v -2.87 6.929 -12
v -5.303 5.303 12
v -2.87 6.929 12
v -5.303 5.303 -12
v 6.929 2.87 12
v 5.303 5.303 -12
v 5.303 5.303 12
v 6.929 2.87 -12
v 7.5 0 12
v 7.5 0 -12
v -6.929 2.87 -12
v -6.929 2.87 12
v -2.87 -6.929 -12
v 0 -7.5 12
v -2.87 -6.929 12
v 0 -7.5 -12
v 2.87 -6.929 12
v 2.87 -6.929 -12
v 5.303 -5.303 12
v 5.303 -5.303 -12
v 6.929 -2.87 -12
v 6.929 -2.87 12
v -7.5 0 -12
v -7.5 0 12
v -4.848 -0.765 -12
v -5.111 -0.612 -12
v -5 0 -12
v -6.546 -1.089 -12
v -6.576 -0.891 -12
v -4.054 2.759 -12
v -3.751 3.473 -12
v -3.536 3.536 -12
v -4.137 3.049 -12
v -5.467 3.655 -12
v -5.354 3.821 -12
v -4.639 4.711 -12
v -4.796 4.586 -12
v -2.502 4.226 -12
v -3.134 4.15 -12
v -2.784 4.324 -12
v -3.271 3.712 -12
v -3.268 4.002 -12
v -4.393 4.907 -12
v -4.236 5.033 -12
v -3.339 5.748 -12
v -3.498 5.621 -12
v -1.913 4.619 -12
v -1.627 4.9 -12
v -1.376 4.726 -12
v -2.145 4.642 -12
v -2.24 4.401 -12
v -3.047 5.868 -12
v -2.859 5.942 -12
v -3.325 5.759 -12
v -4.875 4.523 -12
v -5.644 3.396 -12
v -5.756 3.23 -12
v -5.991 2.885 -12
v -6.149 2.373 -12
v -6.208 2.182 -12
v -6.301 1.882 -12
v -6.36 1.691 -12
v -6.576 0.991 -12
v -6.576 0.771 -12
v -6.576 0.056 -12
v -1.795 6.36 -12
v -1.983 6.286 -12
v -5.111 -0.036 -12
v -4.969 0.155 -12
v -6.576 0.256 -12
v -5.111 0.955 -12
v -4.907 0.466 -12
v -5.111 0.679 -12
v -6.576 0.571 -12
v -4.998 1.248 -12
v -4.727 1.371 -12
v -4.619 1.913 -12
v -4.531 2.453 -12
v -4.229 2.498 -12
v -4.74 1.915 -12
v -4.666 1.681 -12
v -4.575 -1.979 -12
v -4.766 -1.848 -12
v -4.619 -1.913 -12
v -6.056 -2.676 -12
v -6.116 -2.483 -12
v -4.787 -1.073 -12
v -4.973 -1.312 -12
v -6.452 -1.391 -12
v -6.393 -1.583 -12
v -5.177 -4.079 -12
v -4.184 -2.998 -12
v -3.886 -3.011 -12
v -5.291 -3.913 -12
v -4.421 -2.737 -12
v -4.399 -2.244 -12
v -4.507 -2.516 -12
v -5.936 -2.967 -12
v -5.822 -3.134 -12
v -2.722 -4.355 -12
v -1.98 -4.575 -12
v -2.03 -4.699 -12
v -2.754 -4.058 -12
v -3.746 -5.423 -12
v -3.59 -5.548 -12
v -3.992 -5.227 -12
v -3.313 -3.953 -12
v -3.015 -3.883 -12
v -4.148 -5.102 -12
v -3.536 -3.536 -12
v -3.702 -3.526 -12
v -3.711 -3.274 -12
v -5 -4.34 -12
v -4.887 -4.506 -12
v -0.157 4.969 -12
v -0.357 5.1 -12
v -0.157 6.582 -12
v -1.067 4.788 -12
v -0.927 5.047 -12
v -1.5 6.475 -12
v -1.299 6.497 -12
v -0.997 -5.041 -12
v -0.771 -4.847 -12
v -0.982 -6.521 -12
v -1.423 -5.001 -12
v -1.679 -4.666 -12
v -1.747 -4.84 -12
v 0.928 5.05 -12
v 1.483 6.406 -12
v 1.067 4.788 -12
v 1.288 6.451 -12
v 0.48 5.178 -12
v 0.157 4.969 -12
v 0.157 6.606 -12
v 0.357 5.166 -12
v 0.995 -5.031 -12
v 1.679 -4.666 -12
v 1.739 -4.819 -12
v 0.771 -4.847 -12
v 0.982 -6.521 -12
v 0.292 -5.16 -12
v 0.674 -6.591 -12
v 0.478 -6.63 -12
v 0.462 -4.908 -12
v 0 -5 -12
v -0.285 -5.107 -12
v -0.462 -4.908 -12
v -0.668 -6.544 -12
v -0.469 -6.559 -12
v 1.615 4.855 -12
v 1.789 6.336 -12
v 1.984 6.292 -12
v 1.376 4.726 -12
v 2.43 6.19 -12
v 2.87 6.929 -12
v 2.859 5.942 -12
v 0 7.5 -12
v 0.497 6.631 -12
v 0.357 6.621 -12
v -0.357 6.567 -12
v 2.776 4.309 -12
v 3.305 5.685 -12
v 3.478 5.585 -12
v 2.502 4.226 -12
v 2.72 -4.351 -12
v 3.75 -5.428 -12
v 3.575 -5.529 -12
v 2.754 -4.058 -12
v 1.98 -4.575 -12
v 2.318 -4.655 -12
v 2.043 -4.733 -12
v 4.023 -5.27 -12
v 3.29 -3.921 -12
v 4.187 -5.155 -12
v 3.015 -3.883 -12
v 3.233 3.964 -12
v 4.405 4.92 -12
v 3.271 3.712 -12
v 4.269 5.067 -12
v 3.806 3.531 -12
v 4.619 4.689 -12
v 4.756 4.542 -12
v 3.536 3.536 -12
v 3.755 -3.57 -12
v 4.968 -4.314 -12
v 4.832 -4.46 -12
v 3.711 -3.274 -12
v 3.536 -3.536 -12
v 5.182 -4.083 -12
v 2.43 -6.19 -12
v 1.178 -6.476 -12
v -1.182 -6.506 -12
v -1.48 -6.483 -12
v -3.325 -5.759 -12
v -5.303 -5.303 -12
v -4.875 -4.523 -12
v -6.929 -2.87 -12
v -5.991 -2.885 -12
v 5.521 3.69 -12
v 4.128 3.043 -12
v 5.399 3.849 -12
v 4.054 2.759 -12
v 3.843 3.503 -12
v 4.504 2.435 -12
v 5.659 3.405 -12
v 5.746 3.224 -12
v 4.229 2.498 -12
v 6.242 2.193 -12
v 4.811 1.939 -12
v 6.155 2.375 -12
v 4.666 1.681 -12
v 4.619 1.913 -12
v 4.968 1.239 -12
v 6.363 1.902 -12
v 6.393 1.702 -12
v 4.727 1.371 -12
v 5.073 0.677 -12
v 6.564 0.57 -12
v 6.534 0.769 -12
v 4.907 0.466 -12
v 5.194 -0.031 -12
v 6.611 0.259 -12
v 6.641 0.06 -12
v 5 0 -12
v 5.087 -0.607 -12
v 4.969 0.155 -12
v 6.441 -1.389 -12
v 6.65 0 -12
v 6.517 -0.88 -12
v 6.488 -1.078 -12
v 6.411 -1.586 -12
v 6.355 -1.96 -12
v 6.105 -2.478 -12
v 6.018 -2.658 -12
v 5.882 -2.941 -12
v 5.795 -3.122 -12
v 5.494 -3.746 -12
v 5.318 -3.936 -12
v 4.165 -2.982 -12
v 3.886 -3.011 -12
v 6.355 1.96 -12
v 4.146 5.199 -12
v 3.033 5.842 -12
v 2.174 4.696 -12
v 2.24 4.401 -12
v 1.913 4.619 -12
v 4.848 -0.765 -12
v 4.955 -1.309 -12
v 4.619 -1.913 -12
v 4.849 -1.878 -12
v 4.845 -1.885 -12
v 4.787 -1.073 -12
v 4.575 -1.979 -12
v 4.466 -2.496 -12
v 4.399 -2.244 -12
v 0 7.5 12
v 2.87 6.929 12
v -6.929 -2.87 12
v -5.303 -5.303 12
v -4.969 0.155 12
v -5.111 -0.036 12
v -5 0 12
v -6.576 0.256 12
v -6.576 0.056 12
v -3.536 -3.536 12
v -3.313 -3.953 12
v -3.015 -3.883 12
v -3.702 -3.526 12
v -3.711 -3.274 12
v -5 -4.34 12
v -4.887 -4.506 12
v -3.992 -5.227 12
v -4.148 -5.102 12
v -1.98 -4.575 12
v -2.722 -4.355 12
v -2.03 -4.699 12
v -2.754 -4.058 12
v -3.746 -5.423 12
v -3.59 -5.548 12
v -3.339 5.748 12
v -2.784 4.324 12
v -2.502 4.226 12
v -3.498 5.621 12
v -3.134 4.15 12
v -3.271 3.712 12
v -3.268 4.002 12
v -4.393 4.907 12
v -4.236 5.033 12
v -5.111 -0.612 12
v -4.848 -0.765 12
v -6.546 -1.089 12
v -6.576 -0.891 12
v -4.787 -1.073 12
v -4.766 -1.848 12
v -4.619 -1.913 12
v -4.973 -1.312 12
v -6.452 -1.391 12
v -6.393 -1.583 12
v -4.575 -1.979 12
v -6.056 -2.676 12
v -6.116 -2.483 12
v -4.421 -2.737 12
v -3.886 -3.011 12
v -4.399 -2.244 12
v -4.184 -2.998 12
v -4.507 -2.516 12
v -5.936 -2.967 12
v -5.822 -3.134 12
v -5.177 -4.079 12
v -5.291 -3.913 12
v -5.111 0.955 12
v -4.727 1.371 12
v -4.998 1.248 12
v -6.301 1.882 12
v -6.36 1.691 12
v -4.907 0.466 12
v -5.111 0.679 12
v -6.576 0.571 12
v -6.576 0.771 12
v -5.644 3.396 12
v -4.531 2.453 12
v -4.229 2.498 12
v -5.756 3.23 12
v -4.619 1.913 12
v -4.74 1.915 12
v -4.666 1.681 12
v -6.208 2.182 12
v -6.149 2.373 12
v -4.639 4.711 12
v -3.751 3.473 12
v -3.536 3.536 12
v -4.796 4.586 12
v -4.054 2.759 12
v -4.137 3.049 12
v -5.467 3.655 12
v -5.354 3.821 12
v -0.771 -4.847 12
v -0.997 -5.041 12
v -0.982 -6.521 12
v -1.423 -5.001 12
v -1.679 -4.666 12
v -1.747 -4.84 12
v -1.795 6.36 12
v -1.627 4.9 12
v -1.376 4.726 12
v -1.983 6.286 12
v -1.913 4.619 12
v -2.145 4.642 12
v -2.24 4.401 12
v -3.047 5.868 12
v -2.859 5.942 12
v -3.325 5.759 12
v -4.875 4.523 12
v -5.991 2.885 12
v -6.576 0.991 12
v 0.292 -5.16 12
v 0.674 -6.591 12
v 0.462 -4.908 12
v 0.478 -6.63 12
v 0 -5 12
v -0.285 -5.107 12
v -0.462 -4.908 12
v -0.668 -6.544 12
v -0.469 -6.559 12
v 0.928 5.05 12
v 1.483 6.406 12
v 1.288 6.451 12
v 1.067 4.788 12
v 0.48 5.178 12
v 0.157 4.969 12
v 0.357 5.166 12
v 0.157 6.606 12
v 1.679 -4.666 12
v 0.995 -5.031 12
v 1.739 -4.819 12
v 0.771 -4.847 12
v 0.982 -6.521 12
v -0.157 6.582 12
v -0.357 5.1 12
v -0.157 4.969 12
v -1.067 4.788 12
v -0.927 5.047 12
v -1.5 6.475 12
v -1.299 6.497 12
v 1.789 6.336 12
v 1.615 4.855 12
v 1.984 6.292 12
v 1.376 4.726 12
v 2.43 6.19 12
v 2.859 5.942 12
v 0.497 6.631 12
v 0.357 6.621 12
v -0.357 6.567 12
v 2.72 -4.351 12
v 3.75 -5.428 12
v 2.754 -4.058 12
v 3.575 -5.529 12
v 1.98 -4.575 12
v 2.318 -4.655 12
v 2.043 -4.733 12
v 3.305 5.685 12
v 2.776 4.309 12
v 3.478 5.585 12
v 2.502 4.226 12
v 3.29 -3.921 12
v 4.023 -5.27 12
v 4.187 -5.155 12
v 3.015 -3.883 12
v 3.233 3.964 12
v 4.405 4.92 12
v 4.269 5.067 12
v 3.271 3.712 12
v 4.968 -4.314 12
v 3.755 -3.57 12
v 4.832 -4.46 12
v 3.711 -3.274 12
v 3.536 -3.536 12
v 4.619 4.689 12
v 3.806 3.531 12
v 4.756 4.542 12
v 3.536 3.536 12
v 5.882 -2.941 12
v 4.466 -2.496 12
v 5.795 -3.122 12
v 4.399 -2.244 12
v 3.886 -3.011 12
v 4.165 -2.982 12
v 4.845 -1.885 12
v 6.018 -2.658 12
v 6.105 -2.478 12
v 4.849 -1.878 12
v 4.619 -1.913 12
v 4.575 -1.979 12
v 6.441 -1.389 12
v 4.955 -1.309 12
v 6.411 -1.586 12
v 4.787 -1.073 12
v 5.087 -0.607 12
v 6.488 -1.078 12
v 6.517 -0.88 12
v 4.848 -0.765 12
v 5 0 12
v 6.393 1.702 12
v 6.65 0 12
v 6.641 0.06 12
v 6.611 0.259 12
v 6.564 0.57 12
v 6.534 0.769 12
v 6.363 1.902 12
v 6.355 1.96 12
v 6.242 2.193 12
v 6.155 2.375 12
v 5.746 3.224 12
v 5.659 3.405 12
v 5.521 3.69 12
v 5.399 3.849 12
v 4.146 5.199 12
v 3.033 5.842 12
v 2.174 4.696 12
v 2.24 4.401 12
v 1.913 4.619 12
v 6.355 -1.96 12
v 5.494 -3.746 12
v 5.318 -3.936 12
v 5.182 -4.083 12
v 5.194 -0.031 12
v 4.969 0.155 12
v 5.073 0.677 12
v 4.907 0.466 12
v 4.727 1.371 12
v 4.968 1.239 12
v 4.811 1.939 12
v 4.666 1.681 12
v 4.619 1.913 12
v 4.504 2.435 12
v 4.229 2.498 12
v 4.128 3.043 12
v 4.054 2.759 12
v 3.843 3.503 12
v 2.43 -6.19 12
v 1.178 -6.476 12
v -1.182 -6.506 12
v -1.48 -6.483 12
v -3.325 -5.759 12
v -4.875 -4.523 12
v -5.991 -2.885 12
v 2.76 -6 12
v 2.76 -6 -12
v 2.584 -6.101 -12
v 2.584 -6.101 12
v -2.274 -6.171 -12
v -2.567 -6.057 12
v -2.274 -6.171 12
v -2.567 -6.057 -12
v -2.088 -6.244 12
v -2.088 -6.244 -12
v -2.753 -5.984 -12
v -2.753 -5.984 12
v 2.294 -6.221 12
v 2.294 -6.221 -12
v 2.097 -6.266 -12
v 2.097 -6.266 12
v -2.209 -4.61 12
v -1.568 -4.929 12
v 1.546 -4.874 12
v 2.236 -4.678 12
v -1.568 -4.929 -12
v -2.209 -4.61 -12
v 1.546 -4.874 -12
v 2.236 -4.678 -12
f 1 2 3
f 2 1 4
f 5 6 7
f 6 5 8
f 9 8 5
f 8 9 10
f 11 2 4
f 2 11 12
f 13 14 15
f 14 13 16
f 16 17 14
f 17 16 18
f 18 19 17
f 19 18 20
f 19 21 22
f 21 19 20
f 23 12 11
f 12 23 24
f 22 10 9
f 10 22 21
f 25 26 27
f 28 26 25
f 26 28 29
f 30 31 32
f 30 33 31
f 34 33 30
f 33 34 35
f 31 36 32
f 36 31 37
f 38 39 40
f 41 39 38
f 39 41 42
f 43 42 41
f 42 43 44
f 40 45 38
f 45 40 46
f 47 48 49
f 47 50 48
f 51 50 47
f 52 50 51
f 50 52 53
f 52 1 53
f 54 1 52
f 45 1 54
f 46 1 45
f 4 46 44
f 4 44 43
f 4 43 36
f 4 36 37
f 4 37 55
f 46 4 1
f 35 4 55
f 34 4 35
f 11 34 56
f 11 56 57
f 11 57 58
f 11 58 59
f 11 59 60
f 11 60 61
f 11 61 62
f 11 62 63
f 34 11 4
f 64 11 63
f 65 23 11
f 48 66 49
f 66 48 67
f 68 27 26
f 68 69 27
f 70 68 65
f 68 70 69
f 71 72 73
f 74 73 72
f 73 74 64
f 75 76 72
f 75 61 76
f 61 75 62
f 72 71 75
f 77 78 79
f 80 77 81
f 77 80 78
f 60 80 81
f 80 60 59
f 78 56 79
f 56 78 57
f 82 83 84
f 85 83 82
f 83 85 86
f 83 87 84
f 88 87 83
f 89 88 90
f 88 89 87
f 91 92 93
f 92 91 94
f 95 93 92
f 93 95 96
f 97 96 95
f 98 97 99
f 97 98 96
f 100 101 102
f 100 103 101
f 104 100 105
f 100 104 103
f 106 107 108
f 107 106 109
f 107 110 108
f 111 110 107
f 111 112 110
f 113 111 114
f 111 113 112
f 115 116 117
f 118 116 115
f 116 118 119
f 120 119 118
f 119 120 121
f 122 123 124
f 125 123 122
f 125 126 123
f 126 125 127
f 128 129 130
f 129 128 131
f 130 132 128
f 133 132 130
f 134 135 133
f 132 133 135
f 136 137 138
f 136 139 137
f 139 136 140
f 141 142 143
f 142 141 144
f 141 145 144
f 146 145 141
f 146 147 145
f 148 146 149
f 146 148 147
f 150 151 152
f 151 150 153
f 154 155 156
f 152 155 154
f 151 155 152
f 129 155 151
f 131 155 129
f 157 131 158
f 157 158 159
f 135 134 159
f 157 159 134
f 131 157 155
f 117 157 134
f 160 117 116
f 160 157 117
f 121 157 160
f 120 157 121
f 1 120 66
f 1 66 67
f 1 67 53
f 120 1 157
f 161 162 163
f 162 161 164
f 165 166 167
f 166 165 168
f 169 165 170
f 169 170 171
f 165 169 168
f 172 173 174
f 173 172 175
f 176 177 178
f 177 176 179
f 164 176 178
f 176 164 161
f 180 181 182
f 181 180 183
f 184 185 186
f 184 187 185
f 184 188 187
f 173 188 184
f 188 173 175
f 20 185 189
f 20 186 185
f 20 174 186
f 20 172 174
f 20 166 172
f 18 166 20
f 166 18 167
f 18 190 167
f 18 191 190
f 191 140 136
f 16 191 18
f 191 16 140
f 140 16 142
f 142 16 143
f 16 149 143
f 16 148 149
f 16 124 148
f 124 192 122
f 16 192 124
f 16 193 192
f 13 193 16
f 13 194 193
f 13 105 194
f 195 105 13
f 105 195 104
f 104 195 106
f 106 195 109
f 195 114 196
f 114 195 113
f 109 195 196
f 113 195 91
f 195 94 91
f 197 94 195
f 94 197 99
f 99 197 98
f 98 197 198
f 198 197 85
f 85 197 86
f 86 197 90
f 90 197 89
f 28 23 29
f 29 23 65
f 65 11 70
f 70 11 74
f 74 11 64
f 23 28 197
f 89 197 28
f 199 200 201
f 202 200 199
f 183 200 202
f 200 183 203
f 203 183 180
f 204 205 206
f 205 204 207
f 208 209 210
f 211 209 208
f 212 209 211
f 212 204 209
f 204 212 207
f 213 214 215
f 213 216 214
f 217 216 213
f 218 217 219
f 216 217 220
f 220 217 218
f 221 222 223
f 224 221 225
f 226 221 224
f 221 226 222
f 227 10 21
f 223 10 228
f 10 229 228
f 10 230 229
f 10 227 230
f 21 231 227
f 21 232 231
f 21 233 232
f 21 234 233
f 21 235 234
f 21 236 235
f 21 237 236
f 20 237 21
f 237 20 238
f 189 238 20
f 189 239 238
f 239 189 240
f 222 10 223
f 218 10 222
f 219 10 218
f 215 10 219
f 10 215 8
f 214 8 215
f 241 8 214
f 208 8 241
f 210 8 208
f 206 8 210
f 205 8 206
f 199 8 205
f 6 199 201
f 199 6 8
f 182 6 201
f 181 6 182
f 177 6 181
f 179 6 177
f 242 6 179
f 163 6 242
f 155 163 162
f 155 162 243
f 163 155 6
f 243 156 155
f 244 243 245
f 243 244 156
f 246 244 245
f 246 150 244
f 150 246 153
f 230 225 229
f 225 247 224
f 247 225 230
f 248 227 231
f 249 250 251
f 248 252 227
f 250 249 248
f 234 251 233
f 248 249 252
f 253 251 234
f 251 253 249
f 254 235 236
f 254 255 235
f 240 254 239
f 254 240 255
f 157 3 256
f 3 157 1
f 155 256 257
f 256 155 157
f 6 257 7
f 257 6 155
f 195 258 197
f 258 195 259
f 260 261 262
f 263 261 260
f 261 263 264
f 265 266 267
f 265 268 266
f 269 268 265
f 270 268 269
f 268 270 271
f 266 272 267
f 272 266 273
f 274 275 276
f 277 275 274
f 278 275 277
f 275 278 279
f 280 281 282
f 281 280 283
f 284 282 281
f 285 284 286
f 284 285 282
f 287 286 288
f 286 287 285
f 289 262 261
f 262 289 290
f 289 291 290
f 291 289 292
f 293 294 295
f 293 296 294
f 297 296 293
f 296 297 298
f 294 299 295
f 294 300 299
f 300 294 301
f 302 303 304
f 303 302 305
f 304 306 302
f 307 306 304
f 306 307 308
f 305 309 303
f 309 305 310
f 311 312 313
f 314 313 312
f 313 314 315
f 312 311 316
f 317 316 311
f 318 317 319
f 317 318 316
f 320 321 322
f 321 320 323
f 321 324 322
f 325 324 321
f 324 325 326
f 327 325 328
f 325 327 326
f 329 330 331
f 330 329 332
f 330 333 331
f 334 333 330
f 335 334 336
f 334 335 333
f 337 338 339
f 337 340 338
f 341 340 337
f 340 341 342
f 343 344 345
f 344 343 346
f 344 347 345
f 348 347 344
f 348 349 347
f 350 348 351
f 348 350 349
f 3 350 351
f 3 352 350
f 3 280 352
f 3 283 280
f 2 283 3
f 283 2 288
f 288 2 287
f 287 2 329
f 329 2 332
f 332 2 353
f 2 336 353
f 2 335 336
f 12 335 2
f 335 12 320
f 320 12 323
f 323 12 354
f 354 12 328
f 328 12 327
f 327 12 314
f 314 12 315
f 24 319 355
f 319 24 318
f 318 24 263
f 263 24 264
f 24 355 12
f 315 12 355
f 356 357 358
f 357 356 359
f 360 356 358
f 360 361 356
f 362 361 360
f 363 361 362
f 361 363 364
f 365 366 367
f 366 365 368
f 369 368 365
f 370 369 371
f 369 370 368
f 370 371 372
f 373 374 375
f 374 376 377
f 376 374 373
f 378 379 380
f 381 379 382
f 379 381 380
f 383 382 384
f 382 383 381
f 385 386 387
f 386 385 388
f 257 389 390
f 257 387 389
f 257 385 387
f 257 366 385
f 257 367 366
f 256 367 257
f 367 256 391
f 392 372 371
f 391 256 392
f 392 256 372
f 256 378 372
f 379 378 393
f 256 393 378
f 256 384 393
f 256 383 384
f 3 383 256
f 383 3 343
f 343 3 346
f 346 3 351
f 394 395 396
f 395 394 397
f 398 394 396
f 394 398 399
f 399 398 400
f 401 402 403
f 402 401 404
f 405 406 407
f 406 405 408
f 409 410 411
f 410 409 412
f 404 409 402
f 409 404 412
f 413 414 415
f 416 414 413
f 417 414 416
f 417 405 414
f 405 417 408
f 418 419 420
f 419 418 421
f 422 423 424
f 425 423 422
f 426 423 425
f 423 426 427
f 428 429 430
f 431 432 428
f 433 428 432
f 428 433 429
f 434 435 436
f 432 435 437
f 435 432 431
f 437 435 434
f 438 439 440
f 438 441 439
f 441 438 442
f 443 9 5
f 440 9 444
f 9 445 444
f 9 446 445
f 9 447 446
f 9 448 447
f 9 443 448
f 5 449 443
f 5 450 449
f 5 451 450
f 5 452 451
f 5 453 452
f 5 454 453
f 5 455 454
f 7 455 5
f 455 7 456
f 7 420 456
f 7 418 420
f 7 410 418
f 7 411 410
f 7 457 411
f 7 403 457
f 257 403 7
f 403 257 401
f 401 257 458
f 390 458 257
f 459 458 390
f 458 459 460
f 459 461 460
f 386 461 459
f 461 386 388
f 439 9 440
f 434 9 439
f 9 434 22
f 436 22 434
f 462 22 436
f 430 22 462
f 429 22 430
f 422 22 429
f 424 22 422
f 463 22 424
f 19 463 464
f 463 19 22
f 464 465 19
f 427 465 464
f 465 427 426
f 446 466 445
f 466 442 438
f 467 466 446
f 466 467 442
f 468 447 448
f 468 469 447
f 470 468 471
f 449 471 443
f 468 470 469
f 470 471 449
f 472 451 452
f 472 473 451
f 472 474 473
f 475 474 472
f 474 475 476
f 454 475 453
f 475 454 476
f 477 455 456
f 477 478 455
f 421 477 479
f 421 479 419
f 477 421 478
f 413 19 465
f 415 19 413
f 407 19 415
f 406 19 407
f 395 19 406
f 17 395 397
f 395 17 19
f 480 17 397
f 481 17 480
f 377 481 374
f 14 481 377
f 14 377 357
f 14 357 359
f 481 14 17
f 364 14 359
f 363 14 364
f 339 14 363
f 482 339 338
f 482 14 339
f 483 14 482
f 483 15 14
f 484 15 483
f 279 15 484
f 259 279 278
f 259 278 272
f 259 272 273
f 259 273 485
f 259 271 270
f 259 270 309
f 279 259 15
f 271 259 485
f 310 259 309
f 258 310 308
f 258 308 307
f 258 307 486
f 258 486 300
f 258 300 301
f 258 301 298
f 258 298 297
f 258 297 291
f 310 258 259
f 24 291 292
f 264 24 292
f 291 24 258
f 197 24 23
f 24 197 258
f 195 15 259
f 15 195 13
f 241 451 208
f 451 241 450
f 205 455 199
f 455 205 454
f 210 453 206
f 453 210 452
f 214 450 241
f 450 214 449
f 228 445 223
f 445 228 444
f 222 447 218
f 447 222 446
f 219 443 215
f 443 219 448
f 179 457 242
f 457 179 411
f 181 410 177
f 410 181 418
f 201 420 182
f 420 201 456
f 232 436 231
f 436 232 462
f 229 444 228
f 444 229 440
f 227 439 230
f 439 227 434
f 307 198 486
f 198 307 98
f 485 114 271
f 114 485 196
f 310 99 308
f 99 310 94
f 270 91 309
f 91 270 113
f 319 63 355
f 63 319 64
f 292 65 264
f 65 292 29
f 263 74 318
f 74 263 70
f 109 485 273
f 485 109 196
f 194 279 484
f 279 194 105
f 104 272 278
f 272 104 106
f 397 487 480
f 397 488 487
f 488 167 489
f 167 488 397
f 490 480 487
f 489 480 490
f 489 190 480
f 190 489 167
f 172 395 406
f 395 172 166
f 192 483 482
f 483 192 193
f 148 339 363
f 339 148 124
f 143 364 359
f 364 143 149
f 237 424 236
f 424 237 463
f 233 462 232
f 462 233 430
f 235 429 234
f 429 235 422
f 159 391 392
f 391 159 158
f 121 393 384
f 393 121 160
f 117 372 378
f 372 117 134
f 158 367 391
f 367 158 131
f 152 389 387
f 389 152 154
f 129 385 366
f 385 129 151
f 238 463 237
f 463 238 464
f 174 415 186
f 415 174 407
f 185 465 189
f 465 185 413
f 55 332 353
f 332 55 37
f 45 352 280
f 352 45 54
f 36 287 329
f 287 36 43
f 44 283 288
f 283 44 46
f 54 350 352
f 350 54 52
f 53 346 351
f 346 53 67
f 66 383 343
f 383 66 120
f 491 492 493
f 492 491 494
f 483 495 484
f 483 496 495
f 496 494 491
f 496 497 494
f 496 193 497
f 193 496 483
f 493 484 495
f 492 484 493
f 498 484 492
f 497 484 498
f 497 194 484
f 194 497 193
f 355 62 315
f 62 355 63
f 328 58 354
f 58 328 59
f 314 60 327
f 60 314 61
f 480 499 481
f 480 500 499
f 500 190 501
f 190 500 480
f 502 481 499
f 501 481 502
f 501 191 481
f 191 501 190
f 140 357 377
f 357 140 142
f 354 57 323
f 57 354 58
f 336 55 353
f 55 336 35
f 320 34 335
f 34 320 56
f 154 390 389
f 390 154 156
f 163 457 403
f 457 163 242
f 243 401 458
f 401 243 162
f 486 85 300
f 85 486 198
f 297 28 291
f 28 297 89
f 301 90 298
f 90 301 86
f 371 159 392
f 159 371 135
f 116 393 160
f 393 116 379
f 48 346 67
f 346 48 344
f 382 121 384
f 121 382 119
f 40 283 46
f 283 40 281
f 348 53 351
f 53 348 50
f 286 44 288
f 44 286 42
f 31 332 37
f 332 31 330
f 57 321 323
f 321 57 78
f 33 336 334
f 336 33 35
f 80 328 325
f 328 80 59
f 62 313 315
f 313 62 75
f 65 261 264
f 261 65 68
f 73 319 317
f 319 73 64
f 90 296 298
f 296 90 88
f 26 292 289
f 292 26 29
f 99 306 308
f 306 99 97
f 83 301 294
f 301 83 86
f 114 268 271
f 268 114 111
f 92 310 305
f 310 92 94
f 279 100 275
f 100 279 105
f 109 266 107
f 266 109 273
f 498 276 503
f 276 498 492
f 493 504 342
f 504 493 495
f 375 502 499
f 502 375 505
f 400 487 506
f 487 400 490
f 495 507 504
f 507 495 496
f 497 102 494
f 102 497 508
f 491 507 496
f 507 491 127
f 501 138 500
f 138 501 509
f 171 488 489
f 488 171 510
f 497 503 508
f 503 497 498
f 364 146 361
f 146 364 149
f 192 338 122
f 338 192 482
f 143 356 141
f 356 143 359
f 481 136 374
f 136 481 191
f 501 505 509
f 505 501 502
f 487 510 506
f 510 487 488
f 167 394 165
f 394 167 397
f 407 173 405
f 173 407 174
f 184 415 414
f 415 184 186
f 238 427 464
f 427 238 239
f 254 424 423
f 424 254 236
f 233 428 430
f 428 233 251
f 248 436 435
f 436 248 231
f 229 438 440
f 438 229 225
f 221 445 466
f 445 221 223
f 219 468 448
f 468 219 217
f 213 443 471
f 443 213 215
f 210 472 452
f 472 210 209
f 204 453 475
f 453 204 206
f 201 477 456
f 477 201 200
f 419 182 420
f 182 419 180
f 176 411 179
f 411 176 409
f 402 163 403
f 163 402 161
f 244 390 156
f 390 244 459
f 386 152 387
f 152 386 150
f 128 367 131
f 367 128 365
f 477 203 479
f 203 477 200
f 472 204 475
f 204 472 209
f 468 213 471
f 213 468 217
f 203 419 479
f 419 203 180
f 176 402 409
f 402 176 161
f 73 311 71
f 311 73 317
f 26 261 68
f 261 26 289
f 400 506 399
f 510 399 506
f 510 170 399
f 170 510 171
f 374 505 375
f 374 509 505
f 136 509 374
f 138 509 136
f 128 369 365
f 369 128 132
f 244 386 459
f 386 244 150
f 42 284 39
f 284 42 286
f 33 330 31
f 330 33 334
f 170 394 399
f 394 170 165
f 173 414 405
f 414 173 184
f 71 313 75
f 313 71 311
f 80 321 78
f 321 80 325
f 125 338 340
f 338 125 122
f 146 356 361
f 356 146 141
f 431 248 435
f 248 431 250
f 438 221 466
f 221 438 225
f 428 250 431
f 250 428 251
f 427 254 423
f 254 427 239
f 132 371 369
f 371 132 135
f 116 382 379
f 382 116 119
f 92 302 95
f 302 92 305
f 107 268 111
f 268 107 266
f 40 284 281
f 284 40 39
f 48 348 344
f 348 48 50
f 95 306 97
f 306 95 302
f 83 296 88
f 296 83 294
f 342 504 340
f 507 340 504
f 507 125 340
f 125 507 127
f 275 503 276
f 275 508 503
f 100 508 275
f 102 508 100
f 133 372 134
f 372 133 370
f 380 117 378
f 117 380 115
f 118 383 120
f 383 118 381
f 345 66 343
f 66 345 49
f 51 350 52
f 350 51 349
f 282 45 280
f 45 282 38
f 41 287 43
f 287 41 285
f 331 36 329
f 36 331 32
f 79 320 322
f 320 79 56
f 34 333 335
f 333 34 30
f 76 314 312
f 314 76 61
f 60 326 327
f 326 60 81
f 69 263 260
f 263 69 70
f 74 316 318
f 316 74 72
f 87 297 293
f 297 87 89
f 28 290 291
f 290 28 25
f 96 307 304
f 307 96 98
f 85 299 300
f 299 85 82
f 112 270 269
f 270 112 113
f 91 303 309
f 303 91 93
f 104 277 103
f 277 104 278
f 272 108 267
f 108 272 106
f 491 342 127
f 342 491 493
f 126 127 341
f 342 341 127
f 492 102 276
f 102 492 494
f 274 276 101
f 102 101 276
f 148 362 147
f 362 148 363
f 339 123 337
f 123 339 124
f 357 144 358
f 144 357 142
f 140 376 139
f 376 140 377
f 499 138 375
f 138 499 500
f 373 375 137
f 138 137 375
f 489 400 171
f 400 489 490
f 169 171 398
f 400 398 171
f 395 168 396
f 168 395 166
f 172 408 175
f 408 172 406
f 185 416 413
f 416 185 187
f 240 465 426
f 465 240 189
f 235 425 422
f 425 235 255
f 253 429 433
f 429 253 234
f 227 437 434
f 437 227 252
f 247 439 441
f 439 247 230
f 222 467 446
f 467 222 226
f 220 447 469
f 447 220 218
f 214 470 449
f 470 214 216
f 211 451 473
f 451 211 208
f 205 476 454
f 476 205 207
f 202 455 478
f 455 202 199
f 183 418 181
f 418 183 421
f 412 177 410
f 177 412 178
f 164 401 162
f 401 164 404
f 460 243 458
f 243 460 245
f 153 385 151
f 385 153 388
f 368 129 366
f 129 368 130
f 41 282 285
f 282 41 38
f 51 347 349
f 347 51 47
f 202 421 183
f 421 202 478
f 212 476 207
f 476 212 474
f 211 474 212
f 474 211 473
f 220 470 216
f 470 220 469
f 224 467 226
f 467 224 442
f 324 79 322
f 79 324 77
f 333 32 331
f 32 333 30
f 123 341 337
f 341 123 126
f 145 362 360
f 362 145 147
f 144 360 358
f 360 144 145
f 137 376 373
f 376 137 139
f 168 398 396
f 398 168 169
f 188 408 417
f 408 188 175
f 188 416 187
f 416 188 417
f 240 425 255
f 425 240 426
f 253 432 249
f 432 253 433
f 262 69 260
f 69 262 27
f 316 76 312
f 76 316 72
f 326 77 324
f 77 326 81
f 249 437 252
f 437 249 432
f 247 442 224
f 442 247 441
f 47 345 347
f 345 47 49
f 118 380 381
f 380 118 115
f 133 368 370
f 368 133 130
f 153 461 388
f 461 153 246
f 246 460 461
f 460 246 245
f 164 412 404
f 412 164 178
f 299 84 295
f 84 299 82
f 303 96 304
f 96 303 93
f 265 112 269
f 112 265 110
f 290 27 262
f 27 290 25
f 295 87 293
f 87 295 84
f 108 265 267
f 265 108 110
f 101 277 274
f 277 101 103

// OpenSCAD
/* toothedLinearBearing
 * based on  Krallinger Sebastian's 2012 model:
 * http://www.thingiverse.com/thing:18219
 * Dual-licensed under 
 * Creative Commons Attribution-ShareAlike 3.0 (CC BY-SA) [http://creativecommons.org/licenses/by-sa/3.0/]
 * and
 * GPL v2 or later [http://www.gnu.org/licenses/].
 */

//Inner Diamiter of the baring. This is the size of the rod it's to be run on, in mm
int_Inner = 10; //[8:100]
//Outer Diamiter of the baring. diffrent shapes may need bigger/smaller outer diamiters
int_Outer = 15; //[15:115]
//Length of the baring
int_Length = 24;//[100]
//printer head diamiter
dec_Dia = 0.2;
//minimum thickness of the outer wall. 
dec_wallThick = 0.85;
//number of teeth, more the better, but dont be silly
int_teeth = 25; //[100]
//coverd length of the inner ring (Im not sure exactly what this does, but it doesnt work right without it)
dec_toothRatio = 0.25;
//number of sides for the outside of the baring (3 = triange, 4 = square ect)
int_sides = 16; //[3:360]

// ************* units.scad ************* //
//thise units are used to keep everything clean
mm = 1;
cm = 10 * mm;
dm = 100 * mm;
m = 1000 * mm;

inch = 25.4 * mm;

X = [1, 0, 0];
Y = [0, 1, 0];
Z = [0, 0, 1];

M3 = 3*mm;
M4 = 4*mm;
M5 = 5*mm;
M6 = 6*mm;
M8 = 8*mm;

epsilon = 0.01*mm;
OS = epsilon;

TLB_linearBearing(int_Inner, int_Outer, int_Length, dec_Dia, dec_wallThick, int_teeth, dec_toothRatio);

module TLB_linearBearing(inner_d, outer_d, h, stringWidth, minWallThickness,	tooths, toothRatio) {
	
	stringWidth          = stringWidth; //!< the layer width of one string
	
	TLB_innerD           = inner_d;
	TLB_outerD           = outer_d;
	TLB_minWallThickness = minWallThickness;
	TLB_h                = h;
	TLB_tooths           = tooths;
	
	TLB_toothRate        = toothRatio;
	
	
	gapWidth             = (TLB_innerD*PI)/TLB_tooths *TLB_toothRate;
	//echo(str("gap Width: ", gapWidth));
	middR                = TLB_outerD/2- TLB_minWallThickness;
	
	//outer ring
	difference() {
		cylinder(r=TLB_outerD/2, h=TLB_h, center=true,$fn=int_sides);
		cylinder(r=middR, h=TLB_h+2*OS, center=true);
	}
	

	difference() {
		union(){
			cylinder(r=TLB_innerD/2 + stringWidth, h=TLB_h, center=true);

			for (i=[0:360 / TLB_tooths : 360]) {
				rotate(a=i,v=Z) translate([-(gapWidth+2*stringWidth)/2, 0, -TLB_h/2])
					cube(size=[gapWidth+2*stringWidth, middR+OS, TLB_h], center=false);
			}
		}
		union(){
			cylinder(r=TLB_innerD/2, h=TLB_h+2*OS, center=true);
			
			for (i=[0:360 / TLB_tooths : 360]) {
				rotate(a=i,v=Z) translate([-gapWidth/2, 0, -TLB_h/2-OS]) 
					cube(size=[gapWidth, middR, TLB_h+2*OS], center=false);
			}
		}
	}
}
